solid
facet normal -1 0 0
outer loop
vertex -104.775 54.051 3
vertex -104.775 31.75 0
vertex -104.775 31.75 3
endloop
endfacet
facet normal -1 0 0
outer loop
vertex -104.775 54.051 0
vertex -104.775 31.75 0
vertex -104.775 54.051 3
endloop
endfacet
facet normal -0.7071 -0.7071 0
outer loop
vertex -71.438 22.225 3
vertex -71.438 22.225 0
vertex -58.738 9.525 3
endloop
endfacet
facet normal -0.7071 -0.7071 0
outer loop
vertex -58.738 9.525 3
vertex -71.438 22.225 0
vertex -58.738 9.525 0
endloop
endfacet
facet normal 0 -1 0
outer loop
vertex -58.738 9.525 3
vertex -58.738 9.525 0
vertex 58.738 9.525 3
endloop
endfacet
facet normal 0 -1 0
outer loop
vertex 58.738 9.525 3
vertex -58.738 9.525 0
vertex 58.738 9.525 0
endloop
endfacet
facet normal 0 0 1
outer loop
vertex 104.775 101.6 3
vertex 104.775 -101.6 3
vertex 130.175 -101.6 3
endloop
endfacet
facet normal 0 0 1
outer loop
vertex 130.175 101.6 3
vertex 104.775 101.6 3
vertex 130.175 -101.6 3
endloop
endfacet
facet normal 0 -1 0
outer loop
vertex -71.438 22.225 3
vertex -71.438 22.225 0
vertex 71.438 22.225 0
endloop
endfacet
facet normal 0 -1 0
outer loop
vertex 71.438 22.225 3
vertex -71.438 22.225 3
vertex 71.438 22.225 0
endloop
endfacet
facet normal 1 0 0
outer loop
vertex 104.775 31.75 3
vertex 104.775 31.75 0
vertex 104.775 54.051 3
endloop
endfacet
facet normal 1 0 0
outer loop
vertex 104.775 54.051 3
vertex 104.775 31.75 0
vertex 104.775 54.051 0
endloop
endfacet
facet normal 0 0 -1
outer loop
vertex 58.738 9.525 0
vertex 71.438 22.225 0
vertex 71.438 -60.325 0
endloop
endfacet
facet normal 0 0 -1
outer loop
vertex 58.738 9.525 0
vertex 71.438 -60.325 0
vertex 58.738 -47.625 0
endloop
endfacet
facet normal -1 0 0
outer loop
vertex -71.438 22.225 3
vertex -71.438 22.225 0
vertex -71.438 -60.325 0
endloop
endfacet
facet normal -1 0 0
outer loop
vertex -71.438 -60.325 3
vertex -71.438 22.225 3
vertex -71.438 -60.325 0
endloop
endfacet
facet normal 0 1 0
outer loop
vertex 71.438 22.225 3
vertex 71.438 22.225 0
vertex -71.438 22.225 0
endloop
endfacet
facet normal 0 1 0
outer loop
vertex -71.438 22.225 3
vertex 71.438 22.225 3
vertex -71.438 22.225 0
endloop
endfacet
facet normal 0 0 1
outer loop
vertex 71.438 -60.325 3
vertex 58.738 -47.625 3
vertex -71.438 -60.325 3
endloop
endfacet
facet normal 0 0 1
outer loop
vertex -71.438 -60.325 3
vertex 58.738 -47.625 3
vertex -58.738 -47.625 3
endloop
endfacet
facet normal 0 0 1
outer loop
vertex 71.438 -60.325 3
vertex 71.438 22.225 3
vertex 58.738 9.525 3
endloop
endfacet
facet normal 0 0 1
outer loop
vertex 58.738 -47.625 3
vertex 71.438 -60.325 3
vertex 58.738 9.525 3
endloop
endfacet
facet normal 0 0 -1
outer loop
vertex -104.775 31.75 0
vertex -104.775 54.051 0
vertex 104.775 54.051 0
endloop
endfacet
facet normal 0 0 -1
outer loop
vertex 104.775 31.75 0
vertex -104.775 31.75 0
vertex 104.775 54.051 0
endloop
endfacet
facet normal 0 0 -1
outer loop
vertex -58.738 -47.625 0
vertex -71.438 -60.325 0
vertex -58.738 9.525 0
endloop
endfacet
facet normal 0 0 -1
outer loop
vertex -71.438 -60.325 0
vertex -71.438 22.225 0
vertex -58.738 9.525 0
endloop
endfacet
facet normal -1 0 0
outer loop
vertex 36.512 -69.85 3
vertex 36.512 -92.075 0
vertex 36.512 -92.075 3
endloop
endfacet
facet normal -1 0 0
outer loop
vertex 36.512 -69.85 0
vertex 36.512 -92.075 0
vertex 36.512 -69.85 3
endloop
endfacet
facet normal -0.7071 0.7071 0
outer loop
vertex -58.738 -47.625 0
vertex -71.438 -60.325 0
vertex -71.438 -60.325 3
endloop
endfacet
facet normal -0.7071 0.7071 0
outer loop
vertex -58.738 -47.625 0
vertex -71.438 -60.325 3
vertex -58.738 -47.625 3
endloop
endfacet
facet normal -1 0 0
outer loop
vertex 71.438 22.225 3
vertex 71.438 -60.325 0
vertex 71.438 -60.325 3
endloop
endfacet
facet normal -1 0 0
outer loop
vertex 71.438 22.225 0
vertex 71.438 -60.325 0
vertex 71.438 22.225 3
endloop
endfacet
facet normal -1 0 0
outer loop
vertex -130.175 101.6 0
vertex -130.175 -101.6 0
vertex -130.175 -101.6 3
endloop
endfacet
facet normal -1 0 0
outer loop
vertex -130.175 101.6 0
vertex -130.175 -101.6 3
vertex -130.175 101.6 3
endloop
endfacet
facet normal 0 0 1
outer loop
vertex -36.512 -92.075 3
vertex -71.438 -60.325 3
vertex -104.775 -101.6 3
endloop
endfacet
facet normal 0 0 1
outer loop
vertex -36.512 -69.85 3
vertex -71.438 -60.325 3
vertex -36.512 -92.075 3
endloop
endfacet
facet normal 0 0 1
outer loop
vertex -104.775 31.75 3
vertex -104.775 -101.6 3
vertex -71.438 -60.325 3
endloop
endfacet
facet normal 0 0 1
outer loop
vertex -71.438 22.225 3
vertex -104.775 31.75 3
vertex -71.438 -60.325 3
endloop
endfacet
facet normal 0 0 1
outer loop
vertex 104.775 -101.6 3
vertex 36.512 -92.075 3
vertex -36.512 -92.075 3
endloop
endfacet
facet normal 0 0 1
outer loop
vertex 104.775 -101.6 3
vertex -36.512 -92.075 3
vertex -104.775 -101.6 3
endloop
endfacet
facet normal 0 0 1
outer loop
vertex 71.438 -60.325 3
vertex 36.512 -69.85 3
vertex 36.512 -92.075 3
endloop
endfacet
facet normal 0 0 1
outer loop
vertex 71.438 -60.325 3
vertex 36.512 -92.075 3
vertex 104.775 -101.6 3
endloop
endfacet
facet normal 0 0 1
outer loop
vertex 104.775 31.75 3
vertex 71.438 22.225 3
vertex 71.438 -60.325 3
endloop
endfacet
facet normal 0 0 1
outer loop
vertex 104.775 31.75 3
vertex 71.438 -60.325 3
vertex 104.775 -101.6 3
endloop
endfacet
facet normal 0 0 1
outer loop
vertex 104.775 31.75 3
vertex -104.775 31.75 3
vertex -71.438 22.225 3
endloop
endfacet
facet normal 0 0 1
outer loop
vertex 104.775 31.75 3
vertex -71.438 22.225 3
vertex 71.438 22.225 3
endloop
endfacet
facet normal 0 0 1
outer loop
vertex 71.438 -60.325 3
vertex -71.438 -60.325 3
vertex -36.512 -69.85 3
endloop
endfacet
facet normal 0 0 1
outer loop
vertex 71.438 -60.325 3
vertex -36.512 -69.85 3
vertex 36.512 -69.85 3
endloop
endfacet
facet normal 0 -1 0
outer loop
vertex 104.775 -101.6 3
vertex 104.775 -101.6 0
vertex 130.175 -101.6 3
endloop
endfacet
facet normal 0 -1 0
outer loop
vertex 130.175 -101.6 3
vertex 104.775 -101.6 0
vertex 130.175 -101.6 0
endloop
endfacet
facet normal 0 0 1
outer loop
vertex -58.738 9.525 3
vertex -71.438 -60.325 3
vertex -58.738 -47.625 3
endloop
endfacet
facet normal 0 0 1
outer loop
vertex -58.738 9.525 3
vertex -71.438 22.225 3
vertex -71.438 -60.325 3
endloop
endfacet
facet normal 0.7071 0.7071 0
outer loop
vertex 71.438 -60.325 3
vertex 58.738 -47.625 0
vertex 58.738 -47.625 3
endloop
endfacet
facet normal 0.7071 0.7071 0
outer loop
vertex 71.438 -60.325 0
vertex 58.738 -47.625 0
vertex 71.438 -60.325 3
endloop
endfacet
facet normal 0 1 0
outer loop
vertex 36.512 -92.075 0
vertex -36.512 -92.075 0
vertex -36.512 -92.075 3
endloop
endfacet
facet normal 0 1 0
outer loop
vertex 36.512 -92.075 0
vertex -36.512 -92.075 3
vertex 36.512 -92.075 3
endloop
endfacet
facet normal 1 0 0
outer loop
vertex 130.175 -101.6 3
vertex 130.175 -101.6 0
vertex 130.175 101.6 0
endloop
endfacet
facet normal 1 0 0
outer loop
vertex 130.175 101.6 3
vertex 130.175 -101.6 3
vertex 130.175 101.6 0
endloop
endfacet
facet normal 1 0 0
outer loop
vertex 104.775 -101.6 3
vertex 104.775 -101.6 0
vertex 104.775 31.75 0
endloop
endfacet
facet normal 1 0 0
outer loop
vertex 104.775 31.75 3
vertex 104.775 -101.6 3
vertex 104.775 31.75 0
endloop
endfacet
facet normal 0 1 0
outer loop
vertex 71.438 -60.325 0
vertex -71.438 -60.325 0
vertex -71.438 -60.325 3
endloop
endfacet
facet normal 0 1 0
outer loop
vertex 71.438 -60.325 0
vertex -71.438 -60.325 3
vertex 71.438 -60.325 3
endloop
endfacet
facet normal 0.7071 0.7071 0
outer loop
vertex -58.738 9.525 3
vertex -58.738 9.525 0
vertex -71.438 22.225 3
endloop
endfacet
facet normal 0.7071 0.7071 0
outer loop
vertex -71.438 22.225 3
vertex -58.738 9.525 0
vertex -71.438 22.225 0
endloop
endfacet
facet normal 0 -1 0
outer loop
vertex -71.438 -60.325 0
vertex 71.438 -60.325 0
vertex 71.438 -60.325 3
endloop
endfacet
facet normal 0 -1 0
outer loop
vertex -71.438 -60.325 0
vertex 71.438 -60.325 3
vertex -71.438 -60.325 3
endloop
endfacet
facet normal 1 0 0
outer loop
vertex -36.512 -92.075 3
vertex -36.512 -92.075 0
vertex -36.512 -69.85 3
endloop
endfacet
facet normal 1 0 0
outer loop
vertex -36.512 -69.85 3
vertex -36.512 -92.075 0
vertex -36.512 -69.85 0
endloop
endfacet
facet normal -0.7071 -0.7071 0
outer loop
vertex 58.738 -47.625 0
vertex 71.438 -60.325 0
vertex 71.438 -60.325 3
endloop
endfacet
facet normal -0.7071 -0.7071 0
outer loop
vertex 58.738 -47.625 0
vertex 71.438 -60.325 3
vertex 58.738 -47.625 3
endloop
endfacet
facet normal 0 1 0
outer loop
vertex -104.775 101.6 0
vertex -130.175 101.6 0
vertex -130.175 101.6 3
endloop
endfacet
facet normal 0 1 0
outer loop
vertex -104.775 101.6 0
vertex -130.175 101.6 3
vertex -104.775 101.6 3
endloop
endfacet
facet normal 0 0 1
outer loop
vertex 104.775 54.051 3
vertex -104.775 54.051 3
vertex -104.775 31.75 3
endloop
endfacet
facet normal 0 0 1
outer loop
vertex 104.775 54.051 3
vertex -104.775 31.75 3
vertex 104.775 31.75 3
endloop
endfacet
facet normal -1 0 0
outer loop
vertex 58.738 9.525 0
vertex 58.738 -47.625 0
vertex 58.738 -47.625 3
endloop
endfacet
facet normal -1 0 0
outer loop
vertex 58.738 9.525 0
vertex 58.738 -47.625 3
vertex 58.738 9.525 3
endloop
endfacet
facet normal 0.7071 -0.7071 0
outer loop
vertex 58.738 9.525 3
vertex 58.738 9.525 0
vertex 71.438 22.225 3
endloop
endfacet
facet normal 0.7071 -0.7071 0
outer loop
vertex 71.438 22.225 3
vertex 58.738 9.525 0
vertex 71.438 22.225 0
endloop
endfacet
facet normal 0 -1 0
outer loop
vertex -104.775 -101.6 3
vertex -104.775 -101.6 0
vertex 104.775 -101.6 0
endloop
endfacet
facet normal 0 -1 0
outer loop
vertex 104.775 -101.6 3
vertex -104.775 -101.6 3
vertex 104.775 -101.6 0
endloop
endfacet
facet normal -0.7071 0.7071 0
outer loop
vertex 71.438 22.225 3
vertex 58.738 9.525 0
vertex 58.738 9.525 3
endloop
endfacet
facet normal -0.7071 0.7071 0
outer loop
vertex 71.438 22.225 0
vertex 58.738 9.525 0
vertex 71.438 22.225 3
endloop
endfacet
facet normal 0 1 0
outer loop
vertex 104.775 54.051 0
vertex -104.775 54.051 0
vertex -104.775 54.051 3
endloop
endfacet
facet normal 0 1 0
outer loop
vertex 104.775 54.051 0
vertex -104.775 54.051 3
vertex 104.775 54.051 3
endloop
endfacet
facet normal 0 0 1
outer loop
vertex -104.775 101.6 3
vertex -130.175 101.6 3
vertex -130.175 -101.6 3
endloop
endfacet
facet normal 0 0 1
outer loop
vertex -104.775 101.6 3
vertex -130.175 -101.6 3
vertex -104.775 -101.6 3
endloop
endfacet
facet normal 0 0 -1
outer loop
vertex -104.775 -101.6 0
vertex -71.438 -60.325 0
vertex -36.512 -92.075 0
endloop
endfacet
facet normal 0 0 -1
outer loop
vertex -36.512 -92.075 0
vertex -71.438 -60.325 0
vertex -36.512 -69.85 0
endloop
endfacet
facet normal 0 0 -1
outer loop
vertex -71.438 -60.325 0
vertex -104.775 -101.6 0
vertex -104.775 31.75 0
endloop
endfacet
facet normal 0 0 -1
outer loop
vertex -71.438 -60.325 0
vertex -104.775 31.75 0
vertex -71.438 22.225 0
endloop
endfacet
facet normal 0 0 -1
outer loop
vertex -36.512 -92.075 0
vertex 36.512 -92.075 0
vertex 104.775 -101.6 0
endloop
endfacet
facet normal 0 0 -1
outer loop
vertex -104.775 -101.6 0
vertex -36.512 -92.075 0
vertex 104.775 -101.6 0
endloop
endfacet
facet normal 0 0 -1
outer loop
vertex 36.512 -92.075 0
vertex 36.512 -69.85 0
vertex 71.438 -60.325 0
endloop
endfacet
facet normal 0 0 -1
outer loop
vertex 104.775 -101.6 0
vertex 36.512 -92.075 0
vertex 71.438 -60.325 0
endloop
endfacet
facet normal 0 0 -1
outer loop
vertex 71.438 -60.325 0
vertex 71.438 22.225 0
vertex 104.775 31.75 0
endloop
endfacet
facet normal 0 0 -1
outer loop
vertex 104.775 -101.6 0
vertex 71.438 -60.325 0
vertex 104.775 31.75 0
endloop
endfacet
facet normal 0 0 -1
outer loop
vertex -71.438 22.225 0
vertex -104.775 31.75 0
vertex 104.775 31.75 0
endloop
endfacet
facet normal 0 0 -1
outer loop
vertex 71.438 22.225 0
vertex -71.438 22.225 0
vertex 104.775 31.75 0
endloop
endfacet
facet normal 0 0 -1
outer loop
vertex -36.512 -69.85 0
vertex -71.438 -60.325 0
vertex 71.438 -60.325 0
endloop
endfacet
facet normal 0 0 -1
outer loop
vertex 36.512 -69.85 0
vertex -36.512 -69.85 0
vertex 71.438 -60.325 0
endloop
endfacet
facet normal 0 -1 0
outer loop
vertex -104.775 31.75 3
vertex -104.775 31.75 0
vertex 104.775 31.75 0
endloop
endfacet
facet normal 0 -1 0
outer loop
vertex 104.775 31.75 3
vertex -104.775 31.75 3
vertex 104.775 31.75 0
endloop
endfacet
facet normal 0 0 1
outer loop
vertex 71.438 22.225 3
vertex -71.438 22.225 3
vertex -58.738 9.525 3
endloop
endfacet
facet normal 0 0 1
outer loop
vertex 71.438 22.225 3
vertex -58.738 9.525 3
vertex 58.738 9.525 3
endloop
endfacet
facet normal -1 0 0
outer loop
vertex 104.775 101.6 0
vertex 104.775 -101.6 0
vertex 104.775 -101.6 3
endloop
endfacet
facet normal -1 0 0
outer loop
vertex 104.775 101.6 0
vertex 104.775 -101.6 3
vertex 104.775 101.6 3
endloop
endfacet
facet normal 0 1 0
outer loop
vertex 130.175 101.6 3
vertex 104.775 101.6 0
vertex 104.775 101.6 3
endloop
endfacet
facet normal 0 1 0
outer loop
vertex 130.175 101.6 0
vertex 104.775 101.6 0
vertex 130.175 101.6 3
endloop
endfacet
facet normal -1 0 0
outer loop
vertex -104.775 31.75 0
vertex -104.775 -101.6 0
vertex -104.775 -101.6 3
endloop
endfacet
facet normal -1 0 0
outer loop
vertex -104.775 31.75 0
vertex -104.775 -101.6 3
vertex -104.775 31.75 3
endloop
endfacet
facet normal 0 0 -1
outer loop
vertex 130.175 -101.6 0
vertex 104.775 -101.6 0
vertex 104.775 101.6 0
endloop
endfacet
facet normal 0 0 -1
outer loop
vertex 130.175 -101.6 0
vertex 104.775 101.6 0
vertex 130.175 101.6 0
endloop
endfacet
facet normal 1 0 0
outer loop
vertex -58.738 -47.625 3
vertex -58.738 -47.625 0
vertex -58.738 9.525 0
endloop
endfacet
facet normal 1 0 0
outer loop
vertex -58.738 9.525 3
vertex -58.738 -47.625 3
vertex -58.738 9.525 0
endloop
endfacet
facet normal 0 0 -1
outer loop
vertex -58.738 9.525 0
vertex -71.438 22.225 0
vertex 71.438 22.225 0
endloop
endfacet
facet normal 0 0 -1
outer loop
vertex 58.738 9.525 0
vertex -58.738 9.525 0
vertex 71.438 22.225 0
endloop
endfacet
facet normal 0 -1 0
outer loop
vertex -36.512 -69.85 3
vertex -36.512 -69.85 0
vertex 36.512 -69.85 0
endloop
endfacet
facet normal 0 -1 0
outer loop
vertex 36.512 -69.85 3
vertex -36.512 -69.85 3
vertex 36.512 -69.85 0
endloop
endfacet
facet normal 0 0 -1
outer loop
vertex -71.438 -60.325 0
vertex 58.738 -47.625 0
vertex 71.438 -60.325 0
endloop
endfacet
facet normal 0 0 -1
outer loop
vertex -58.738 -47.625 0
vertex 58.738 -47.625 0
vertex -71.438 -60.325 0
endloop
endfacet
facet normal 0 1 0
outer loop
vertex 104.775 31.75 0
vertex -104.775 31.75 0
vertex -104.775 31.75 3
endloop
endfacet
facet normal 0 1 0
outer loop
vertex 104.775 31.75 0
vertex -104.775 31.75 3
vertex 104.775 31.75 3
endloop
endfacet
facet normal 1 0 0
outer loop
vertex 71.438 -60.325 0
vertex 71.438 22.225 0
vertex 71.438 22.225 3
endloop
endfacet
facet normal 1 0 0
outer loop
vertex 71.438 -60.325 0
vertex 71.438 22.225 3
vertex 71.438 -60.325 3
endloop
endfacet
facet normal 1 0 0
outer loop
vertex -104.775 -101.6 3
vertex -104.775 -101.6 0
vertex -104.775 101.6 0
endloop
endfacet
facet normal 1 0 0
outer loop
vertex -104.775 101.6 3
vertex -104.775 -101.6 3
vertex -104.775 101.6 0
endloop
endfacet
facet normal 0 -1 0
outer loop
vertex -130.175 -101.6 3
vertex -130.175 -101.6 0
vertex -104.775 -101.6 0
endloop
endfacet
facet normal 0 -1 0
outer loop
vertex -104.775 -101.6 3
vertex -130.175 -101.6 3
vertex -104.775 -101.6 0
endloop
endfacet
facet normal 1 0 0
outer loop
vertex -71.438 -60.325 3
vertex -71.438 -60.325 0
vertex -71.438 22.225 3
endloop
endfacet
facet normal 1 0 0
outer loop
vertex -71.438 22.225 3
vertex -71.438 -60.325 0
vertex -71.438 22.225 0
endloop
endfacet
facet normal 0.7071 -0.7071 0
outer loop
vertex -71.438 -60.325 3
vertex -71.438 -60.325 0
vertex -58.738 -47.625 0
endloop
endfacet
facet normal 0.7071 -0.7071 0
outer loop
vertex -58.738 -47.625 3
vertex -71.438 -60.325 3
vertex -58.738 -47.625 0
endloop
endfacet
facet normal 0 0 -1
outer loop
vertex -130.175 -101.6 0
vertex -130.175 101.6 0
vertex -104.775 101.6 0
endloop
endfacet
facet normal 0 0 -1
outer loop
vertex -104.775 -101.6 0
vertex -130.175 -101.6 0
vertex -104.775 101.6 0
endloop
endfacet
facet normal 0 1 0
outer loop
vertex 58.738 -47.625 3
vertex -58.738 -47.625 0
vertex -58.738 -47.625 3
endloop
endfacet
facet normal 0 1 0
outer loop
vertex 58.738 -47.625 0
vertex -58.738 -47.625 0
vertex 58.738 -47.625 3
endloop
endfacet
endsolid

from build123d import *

# Parameters (mm, degrees)
SKETCH001_W   = 209.55
SKETCH001_H   = 133.35
SKETCH001_W_2 = 142.875
SKETCH001_H_2 = 82.55
SKETCH001_W_3 = 73.025
SKETCH001_H_3 = 22.225
PAD_DEPTH     = 3
SKETCH004_W   = 209.55
SKETCH004_H   = 22.3012
PAD001_DEPTH  = 3
SKETCH007_W   = 25.4
SKETCH007_H   = 203.2
PAD003_DEPTH  = 3
SKETCH009_W   = 25.4
SKETCH009_H   = 203.2
PAD004_DEPTH  = 3
PAD005_DEPTH  = 3
PAD006_DEPTH  = 3
PAD007_DEPTH  = 3
PAD008_DEPTH  = 3


with BuildPart() as main:
    # Sketch001 → Pad (new body)
    with BuildSketch(Plane.XY):
        with Locations((0, -34.925)):
            Rectangle(SKETCH001_W, SKETCH001_H)
        with Locations((0, -19.05)):
            Rectangle(SKETCH001_W_2, SKETCH001_H_2, mode=Mode.SUBTRACT)
        with Locations((0, -80.9625)):
            Rectangle(SKETCH001_W_3, SKETCH001_H_3, mode=Mode.SUBTRACT)
    extrude(amount=PAD_DEPTH)


with BuildPart() as top_flap:
    # Sketch004 → Pad001 (new body)
    with BuildSketch(Plane.XY):
        with Locations((0, 42.9006)):
            Rectangle(SKETCH004_W, SKETCH004_H)
    extrude(amount=PAD001_DEPTH)


with BuildPart() as side_l:
    # Sketch007 → Pad003 (new body)
    with BuildSketch(Plane.XY):
        with Locations((-117.475, 0)):
            Rectangle(SKETCH007_W, SKETCH007_H)
    extrude(amount=PAD003_DEPTH)


with BuildPart() as side_r:
    # Sketch009 → Pad004 (new body)
    with BuildSketch(Plane.XY):
        with Locations((117.475, 0)):
            Rectangle(SKETCH009_W, SKETCH009_H)
    extrude(amount=PAD004_DEPTH)


with BuildPart() as inner_right:
    # Sketch013 → Pad005 (new body)
    with BuildSketch(Plane.XY):
        Polygon((58.7375, 9.525), (71.4375, 22.225), (71.4375, -60.325), (58.7375, -47.625), align=None)
    extrude(amount=PAD005_DEPTH)


with BuildPart() as inner_left:
    # Sketch012 → Pad006 (new body)
    with BuildSketch(Plane.XY):
        Polygon((-71.4375, -60.325), (-58.7375, -47.625), (-58.7375, 9.525), (-71.4375, 22.225), align=None)
    extrude(amount=PAD006_DEPTH)


with BuildPart() as inner_bottom:
    # Sketch011 → Pad007 (new body)
    with BuildSketch(Plane.XY):
        Polygon((-71.4375, -60.325), (-58.7375, -47.625), (58.7375, -47.625), (71.4375, -60.325), align=None)
    extrude(amount=PAD007_DEPTH)


with BuildPart() as inner_top:
    # Sketch010 → Pad008 (new body)
    with BuildSketch(Plane.XY):
        Polygon((-58.7375, 9.525), (58.7375, 9.525), (71.4375, 22.225), (-71.4375, 22.225), align=None)
    extrude(amount=PAD008_DEPTH)


solid = Compound([main.part, top_flap.part, side_l.part, side_r.part, inner_right.part, inner_left.part, inner_bottom.part, inner_top.part])
